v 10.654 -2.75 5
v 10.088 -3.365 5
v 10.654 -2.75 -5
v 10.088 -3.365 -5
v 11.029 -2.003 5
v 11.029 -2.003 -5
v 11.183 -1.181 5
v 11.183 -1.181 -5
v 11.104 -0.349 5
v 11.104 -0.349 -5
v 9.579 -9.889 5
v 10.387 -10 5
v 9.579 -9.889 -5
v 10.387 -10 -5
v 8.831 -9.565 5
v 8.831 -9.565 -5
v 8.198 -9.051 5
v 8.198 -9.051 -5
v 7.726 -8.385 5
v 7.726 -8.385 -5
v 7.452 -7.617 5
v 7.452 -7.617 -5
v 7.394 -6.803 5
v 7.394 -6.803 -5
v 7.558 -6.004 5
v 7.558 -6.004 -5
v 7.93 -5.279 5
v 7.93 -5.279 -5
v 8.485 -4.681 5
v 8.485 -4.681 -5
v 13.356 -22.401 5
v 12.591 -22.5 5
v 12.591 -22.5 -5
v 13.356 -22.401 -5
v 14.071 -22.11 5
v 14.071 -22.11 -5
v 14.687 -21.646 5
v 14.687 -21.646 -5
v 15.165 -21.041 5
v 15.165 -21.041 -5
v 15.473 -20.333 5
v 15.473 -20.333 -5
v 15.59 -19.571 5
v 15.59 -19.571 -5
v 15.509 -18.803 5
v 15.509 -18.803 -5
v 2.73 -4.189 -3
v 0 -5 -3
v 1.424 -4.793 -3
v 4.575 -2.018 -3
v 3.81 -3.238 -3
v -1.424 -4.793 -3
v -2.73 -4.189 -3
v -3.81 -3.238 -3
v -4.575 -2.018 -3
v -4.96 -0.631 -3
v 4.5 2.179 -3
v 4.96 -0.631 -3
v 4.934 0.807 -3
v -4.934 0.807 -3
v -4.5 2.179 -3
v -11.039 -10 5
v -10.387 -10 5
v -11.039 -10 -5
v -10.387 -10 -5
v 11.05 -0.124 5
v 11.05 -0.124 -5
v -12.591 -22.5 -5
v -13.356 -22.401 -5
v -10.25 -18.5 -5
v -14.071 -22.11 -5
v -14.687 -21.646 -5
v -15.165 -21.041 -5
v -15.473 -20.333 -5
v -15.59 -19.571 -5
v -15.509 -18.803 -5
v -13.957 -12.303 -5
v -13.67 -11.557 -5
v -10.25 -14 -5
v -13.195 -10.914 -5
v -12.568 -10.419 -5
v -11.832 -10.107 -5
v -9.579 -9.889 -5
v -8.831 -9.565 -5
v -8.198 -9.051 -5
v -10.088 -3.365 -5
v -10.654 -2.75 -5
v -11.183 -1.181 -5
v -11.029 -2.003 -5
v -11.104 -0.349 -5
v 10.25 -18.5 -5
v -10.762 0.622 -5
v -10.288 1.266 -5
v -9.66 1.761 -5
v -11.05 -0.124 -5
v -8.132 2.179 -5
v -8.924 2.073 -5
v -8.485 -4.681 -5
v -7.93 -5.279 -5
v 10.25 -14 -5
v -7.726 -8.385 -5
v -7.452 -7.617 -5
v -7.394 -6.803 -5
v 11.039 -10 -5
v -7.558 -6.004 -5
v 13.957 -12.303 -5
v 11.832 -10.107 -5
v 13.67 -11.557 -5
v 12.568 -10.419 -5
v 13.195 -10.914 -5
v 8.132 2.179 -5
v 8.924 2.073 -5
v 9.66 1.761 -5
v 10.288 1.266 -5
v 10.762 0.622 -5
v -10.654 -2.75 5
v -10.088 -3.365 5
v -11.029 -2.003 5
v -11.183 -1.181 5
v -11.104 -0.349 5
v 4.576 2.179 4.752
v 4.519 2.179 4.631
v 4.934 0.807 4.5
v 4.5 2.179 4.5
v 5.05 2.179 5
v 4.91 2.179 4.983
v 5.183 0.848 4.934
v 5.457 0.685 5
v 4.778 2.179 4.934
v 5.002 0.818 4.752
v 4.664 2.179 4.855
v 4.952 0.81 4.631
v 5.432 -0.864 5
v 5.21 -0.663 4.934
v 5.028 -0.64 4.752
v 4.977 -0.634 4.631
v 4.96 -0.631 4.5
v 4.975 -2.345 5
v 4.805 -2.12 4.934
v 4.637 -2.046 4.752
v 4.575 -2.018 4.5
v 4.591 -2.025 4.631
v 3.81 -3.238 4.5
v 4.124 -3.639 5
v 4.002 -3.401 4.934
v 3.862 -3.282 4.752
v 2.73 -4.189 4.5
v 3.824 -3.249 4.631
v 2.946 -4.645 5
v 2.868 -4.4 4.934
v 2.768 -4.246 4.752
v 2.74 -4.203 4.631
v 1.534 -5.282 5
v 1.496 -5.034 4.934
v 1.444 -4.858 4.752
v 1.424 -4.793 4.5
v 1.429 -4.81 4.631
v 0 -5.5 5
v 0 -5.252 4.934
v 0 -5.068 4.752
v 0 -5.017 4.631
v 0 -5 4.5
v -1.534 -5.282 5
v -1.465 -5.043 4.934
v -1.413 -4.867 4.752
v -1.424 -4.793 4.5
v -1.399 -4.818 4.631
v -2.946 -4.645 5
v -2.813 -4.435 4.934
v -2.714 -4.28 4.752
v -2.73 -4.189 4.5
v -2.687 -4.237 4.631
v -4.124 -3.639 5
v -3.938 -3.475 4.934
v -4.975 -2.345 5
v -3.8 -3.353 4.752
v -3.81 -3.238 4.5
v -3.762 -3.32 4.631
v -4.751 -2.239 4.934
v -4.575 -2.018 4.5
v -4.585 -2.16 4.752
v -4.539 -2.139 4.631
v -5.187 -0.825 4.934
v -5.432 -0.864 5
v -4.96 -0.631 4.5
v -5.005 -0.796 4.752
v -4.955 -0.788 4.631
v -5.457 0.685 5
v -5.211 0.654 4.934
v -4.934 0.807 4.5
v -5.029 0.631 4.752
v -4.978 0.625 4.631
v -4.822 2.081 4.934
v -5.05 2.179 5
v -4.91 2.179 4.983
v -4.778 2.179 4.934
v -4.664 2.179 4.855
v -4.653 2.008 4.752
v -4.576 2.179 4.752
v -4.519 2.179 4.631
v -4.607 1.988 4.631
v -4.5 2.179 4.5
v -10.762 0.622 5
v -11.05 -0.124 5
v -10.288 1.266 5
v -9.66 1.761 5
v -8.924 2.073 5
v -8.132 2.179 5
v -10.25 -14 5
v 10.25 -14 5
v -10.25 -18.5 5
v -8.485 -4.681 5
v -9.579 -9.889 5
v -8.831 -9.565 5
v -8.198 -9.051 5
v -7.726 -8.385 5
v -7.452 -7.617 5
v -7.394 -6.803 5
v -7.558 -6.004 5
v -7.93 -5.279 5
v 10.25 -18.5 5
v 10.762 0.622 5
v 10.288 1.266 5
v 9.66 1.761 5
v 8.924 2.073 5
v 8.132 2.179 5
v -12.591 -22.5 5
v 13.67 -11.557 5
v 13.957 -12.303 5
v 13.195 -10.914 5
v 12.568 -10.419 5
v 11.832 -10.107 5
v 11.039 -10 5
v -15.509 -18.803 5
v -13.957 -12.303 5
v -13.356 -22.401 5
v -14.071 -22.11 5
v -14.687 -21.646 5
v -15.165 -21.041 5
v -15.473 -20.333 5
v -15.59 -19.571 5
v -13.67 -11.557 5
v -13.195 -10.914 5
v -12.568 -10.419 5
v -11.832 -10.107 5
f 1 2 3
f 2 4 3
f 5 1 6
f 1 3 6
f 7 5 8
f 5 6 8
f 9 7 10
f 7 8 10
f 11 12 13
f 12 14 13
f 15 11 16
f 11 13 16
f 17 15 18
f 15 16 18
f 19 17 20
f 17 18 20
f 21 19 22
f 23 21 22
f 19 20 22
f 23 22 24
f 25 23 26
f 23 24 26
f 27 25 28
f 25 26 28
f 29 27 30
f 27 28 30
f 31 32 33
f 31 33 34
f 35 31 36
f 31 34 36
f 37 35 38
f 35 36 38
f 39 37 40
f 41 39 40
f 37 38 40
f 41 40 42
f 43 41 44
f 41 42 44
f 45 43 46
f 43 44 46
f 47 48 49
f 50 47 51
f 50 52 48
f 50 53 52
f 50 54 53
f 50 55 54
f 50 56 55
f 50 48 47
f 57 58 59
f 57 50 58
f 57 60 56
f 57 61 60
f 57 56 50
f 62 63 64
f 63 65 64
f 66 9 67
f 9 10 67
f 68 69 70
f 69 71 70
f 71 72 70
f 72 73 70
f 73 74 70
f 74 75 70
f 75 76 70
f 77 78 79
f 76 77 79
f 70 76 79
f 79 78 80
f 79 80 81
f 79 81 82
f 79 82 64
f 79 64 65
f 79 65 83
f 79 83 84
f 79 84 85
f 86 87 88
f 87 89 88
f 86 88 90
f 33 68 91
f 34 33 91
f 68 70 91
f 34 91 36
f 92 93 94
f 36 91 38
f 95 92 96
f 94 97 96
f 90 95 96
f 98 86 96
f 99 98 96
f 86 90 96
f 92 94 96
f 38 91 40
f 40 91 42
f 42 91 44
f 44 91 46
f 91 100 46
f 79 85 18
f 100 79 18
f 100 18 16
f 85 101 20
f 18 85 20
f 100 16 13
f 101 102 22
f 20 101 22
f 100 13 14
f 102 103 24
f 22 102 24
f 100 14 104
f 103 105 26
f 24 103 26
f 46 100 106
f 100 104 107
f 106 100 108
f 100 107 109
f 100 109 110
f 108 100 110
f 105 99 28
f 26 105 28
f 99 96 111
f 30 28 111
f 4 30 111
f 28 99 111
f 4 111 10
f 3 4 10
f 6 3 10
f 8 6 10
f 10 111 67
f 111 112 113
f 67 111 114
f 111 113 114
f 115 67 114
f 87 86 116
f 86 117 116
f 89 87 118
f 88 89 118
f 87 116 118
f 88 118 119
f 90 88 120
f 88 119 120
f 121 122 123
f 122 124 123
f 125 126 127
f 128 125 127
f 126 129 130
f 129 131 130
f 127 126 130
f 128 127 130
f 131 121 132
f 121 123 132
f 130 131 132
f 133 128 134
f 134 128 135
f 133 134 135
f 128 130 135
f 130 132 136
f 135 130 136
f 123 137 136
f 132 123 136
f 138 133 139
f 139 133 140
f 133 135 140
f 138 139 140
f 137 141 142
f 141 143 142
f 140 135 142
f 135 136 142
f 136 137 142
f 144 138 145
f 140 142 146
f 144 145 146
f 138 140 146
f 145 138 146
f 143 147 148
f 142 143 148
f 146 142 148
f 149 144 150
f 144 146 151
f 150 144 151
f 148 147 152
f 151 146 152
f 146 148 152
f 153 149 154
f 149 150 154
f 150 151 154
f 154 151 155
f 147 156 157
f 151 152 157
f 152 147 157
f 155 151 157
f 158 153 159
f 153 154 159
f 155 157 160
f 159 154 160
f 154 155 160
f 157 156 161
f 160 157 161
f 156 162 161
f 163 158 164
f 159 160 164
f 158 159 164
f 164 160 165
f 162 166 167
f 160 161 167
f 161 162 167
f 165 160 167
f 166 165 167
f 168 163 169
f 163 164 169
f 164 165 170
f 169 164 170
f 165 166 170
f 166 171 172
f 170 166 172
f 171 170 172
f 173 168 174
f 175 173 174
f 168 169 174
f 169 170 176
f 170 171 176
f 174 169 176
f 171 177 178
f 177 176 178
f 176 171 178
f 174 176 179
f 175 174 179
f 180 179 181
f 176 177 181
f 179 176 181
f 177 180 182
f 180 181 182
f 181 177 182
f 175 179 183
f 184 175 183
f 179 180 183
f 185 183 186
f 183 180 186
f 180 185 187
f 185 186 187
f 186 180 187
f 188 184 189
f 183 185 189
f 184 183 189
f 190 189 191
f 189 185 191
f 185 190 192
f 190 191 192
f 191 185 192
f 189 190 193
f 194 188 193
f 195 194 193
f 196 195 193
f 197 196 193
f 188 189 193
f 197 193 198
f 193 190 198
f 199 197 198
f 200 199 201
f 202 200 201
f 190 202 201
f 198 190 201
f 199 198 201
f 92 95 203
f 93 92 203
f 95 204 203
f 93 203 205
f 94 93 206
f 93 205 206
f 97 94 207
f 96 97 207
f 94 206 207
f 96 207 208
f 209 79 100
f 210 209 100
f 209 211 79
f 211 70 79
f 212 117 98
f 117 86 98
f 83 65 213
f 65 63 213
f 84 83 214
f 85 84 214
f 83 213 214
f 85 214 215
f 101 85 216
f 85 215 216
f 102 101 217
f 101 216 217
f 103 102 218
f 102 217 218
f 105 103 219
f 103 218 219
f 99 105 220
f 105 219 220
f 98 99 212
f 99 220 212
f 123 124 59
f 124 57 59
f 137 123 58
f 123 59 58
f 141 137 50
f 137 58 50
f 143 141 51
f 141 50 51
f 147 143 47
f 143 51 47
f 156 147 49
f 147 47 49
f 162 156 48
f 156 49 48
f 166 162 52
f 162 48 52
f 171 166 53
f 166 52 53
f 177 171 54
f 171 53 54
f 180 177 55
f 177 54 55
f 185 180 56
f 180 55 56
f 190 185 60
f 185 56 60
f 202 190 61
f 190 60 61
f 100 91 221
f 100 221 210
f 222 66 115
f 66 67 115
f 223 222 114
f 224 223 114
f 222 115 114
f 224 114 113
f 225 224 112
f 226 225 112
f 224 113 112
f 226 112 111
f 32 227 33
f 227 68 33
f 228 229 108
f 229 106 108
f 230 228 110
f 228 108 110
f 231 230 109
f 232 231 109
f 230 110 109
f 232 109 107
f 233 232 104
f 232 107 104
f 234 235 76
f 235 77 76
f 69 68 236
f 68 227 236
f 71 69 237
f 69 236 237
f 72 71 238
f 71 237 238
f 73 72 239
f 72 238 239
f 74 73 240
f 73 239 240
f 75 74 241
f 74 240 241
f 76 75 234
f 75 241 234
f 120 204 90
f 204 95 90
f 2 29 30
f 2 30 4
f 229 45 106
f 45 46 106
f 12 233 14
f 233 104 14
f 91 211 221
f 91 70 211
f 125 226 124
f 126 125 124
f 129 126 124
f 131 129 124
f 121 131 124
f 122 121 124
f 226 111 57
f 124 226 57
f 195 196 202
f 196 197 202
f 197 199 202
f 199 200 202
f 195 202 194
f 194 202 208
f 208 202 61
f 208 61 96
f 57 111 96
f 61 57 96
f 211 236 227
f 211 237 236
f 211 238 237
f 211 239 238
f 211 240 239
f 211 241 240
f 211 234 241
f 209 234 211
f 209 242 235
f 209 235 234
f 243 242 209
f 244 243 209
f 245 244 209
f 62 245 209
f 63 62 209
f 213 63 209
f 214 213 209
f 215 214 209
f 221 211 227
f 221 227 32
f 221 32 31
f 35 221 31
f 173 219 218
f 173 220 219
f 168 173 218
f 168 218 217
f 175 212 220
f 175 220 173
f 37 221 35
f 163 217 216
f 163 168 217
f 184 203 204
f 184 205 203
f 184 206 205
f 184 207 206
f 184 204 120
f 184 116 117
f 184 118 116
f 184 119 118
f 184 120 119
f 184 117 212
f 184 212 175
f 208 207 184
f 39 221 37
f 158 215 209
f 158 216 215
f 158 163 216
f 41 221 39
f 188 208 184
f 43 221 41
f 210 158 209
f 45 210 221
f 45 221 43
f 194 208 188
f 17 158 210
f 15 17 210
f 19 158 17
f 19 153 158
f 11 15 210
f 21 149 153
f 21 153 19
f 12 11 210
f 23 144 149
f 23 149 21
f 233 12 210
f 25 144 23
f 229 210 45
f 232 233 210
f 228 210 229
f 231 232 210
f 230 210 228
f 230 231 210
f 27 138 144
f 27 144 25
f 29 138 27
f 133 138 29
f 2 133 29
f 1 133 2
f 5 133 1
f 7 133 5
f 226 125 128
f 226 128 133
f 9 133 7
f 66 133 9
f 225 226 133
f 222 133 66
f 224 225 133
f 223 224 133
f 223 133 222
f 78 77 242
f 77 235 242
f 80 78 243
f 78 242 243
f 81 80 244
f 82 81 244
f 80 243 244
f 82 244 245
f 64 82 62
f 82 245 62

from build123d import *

# Parameters (mm, degrees)
F0_W     = 20.5
F0_H     = 4.5
F1_DEPTH = 5
F2_DEPTH = 5
F3_R     = 3
F4_R     = 0.5
F5_DEPTH = 3


with BuildPart() as f1:
    # F0 (on Top) → F1 (new body)
    with BuildSketch(Plane.XY):
        with BuildLine():
            ThreePointArc((4.5, 2.1794494718), (0, -5), (-4.5, 2.1794494718))
            Line((-4.5, 2.1794494718), (-10.5, 2.1794494718))
            Line((-10.5, 2.1794494718), (-11.5394689808, -2.1748499468))
            Line((-11.5394689808, -2.1748499468), (-2, -10))
            Line((-2, -10), (-13.4075078933, -10))
            Line((-13.4075078933, -10), (-16.3915383908, -22.5))
            Line((-16.3915383908, -22.5), (16.3915383908, -22.5))
            Line((16.3915383908, -22.5), (13.4075078933, -10))
            Line((13.4075078933, -10), (2, -10))
            Line((2, -10), (11.5394689808, -2.1748499468))
            Line((11.5394689808, -2.1748499468), (10.5, 2.1794494718))
            Line((10.5, 2.1794494718), (4.5, 2.1794494718))
        make_face()
        with Locations((0, -16.25)):
            Rectangle(F0_W, F0_H, mode=Mode.SUBTRACT)
        with BuildLine():
            Line((4.5, 2.1794494718), (-4.5, 2.1794494718))
            ThreePointArc((-4.5, 2.1794494718), (0, -5), (4.5, 2.1794494718))
        make_face()
    extrude(amount=-F1_DEPTH)

    # F0 (on Top) → F2 (join)
    with BuildSketch(Plane.XY):
        with BuildLine():
            ThreePointArc((4.5, 2.1794494718), (0, -5), (-4.5, 2.1794494718))
            Line((-4.5, 2.1794494718), (-10.5, 2.1794494718))
            Line((-10.5, 2.1794494718), (-11.5394689808, -2.1748499468))
            Line((-11.5394689808, -2.1748499468), (-2, -10))
            Line((-2, -10), (-13.4075078933, -10))
            Line((-13.4075078933, -10), (-16.3915383908, -22.5))
            Line((-16.3915383908, -22.5), (16.3915383908, -22.5))
            Line((16.3915383908, -22.5), (13.4075078933, -10))
            Line((13.4075078933, -10), (2, -10))
            Line((2, -10), (11.5394689808, -2.1748499468))
            Line((11.5394689808, -2.1748499468), (10.5, 2.1794494718))
            Line((10.5, 2.1794494718), (4.5, 2.1794494718))
        make_face()
        with Locations((0, -16.25)):
            Rectangle(F0_W, F0_H, mode=Mode.SUBTRACT)
    extrude(amount=F2_DEPTH)

    # F3
    f3_edges = [f1.edges().sort_by_distance(p)[0] for p in [
        (-16.391538, -22.5, 0),
        (16.391538, -22.5, 0),
        (-10.5, 2.179449, 0),
        (10.5, 2.179449, 0),
        (-2, -10, 0),
        (-13.407508, -10, 0),
        (-11.539469, -2.17485, 0),
        (11.539469, -2.17485, 0),
        (13.407508, -10, 0),
        (2, -10, 0),
    ]]
    fillet(f3_edges, radius=F3_R)

    # F4
    f4_edges = [f1.edges().sort_by_distance(p)[0] for p in [
        (0, -5, 5),
    ]]
    fillet(f4_edges, radius=F4_R)

    # F5 (cut): a face of the model
    f5_faces = [f1.faces().sort_by_distance(p)[0] for p in [
        (0, -1.0065762803, 0),
    ]]
    extrude(f5_faces, amount=-F5_DEPTH, mode=Mode.SUBTRACT)


solid = f1.part
